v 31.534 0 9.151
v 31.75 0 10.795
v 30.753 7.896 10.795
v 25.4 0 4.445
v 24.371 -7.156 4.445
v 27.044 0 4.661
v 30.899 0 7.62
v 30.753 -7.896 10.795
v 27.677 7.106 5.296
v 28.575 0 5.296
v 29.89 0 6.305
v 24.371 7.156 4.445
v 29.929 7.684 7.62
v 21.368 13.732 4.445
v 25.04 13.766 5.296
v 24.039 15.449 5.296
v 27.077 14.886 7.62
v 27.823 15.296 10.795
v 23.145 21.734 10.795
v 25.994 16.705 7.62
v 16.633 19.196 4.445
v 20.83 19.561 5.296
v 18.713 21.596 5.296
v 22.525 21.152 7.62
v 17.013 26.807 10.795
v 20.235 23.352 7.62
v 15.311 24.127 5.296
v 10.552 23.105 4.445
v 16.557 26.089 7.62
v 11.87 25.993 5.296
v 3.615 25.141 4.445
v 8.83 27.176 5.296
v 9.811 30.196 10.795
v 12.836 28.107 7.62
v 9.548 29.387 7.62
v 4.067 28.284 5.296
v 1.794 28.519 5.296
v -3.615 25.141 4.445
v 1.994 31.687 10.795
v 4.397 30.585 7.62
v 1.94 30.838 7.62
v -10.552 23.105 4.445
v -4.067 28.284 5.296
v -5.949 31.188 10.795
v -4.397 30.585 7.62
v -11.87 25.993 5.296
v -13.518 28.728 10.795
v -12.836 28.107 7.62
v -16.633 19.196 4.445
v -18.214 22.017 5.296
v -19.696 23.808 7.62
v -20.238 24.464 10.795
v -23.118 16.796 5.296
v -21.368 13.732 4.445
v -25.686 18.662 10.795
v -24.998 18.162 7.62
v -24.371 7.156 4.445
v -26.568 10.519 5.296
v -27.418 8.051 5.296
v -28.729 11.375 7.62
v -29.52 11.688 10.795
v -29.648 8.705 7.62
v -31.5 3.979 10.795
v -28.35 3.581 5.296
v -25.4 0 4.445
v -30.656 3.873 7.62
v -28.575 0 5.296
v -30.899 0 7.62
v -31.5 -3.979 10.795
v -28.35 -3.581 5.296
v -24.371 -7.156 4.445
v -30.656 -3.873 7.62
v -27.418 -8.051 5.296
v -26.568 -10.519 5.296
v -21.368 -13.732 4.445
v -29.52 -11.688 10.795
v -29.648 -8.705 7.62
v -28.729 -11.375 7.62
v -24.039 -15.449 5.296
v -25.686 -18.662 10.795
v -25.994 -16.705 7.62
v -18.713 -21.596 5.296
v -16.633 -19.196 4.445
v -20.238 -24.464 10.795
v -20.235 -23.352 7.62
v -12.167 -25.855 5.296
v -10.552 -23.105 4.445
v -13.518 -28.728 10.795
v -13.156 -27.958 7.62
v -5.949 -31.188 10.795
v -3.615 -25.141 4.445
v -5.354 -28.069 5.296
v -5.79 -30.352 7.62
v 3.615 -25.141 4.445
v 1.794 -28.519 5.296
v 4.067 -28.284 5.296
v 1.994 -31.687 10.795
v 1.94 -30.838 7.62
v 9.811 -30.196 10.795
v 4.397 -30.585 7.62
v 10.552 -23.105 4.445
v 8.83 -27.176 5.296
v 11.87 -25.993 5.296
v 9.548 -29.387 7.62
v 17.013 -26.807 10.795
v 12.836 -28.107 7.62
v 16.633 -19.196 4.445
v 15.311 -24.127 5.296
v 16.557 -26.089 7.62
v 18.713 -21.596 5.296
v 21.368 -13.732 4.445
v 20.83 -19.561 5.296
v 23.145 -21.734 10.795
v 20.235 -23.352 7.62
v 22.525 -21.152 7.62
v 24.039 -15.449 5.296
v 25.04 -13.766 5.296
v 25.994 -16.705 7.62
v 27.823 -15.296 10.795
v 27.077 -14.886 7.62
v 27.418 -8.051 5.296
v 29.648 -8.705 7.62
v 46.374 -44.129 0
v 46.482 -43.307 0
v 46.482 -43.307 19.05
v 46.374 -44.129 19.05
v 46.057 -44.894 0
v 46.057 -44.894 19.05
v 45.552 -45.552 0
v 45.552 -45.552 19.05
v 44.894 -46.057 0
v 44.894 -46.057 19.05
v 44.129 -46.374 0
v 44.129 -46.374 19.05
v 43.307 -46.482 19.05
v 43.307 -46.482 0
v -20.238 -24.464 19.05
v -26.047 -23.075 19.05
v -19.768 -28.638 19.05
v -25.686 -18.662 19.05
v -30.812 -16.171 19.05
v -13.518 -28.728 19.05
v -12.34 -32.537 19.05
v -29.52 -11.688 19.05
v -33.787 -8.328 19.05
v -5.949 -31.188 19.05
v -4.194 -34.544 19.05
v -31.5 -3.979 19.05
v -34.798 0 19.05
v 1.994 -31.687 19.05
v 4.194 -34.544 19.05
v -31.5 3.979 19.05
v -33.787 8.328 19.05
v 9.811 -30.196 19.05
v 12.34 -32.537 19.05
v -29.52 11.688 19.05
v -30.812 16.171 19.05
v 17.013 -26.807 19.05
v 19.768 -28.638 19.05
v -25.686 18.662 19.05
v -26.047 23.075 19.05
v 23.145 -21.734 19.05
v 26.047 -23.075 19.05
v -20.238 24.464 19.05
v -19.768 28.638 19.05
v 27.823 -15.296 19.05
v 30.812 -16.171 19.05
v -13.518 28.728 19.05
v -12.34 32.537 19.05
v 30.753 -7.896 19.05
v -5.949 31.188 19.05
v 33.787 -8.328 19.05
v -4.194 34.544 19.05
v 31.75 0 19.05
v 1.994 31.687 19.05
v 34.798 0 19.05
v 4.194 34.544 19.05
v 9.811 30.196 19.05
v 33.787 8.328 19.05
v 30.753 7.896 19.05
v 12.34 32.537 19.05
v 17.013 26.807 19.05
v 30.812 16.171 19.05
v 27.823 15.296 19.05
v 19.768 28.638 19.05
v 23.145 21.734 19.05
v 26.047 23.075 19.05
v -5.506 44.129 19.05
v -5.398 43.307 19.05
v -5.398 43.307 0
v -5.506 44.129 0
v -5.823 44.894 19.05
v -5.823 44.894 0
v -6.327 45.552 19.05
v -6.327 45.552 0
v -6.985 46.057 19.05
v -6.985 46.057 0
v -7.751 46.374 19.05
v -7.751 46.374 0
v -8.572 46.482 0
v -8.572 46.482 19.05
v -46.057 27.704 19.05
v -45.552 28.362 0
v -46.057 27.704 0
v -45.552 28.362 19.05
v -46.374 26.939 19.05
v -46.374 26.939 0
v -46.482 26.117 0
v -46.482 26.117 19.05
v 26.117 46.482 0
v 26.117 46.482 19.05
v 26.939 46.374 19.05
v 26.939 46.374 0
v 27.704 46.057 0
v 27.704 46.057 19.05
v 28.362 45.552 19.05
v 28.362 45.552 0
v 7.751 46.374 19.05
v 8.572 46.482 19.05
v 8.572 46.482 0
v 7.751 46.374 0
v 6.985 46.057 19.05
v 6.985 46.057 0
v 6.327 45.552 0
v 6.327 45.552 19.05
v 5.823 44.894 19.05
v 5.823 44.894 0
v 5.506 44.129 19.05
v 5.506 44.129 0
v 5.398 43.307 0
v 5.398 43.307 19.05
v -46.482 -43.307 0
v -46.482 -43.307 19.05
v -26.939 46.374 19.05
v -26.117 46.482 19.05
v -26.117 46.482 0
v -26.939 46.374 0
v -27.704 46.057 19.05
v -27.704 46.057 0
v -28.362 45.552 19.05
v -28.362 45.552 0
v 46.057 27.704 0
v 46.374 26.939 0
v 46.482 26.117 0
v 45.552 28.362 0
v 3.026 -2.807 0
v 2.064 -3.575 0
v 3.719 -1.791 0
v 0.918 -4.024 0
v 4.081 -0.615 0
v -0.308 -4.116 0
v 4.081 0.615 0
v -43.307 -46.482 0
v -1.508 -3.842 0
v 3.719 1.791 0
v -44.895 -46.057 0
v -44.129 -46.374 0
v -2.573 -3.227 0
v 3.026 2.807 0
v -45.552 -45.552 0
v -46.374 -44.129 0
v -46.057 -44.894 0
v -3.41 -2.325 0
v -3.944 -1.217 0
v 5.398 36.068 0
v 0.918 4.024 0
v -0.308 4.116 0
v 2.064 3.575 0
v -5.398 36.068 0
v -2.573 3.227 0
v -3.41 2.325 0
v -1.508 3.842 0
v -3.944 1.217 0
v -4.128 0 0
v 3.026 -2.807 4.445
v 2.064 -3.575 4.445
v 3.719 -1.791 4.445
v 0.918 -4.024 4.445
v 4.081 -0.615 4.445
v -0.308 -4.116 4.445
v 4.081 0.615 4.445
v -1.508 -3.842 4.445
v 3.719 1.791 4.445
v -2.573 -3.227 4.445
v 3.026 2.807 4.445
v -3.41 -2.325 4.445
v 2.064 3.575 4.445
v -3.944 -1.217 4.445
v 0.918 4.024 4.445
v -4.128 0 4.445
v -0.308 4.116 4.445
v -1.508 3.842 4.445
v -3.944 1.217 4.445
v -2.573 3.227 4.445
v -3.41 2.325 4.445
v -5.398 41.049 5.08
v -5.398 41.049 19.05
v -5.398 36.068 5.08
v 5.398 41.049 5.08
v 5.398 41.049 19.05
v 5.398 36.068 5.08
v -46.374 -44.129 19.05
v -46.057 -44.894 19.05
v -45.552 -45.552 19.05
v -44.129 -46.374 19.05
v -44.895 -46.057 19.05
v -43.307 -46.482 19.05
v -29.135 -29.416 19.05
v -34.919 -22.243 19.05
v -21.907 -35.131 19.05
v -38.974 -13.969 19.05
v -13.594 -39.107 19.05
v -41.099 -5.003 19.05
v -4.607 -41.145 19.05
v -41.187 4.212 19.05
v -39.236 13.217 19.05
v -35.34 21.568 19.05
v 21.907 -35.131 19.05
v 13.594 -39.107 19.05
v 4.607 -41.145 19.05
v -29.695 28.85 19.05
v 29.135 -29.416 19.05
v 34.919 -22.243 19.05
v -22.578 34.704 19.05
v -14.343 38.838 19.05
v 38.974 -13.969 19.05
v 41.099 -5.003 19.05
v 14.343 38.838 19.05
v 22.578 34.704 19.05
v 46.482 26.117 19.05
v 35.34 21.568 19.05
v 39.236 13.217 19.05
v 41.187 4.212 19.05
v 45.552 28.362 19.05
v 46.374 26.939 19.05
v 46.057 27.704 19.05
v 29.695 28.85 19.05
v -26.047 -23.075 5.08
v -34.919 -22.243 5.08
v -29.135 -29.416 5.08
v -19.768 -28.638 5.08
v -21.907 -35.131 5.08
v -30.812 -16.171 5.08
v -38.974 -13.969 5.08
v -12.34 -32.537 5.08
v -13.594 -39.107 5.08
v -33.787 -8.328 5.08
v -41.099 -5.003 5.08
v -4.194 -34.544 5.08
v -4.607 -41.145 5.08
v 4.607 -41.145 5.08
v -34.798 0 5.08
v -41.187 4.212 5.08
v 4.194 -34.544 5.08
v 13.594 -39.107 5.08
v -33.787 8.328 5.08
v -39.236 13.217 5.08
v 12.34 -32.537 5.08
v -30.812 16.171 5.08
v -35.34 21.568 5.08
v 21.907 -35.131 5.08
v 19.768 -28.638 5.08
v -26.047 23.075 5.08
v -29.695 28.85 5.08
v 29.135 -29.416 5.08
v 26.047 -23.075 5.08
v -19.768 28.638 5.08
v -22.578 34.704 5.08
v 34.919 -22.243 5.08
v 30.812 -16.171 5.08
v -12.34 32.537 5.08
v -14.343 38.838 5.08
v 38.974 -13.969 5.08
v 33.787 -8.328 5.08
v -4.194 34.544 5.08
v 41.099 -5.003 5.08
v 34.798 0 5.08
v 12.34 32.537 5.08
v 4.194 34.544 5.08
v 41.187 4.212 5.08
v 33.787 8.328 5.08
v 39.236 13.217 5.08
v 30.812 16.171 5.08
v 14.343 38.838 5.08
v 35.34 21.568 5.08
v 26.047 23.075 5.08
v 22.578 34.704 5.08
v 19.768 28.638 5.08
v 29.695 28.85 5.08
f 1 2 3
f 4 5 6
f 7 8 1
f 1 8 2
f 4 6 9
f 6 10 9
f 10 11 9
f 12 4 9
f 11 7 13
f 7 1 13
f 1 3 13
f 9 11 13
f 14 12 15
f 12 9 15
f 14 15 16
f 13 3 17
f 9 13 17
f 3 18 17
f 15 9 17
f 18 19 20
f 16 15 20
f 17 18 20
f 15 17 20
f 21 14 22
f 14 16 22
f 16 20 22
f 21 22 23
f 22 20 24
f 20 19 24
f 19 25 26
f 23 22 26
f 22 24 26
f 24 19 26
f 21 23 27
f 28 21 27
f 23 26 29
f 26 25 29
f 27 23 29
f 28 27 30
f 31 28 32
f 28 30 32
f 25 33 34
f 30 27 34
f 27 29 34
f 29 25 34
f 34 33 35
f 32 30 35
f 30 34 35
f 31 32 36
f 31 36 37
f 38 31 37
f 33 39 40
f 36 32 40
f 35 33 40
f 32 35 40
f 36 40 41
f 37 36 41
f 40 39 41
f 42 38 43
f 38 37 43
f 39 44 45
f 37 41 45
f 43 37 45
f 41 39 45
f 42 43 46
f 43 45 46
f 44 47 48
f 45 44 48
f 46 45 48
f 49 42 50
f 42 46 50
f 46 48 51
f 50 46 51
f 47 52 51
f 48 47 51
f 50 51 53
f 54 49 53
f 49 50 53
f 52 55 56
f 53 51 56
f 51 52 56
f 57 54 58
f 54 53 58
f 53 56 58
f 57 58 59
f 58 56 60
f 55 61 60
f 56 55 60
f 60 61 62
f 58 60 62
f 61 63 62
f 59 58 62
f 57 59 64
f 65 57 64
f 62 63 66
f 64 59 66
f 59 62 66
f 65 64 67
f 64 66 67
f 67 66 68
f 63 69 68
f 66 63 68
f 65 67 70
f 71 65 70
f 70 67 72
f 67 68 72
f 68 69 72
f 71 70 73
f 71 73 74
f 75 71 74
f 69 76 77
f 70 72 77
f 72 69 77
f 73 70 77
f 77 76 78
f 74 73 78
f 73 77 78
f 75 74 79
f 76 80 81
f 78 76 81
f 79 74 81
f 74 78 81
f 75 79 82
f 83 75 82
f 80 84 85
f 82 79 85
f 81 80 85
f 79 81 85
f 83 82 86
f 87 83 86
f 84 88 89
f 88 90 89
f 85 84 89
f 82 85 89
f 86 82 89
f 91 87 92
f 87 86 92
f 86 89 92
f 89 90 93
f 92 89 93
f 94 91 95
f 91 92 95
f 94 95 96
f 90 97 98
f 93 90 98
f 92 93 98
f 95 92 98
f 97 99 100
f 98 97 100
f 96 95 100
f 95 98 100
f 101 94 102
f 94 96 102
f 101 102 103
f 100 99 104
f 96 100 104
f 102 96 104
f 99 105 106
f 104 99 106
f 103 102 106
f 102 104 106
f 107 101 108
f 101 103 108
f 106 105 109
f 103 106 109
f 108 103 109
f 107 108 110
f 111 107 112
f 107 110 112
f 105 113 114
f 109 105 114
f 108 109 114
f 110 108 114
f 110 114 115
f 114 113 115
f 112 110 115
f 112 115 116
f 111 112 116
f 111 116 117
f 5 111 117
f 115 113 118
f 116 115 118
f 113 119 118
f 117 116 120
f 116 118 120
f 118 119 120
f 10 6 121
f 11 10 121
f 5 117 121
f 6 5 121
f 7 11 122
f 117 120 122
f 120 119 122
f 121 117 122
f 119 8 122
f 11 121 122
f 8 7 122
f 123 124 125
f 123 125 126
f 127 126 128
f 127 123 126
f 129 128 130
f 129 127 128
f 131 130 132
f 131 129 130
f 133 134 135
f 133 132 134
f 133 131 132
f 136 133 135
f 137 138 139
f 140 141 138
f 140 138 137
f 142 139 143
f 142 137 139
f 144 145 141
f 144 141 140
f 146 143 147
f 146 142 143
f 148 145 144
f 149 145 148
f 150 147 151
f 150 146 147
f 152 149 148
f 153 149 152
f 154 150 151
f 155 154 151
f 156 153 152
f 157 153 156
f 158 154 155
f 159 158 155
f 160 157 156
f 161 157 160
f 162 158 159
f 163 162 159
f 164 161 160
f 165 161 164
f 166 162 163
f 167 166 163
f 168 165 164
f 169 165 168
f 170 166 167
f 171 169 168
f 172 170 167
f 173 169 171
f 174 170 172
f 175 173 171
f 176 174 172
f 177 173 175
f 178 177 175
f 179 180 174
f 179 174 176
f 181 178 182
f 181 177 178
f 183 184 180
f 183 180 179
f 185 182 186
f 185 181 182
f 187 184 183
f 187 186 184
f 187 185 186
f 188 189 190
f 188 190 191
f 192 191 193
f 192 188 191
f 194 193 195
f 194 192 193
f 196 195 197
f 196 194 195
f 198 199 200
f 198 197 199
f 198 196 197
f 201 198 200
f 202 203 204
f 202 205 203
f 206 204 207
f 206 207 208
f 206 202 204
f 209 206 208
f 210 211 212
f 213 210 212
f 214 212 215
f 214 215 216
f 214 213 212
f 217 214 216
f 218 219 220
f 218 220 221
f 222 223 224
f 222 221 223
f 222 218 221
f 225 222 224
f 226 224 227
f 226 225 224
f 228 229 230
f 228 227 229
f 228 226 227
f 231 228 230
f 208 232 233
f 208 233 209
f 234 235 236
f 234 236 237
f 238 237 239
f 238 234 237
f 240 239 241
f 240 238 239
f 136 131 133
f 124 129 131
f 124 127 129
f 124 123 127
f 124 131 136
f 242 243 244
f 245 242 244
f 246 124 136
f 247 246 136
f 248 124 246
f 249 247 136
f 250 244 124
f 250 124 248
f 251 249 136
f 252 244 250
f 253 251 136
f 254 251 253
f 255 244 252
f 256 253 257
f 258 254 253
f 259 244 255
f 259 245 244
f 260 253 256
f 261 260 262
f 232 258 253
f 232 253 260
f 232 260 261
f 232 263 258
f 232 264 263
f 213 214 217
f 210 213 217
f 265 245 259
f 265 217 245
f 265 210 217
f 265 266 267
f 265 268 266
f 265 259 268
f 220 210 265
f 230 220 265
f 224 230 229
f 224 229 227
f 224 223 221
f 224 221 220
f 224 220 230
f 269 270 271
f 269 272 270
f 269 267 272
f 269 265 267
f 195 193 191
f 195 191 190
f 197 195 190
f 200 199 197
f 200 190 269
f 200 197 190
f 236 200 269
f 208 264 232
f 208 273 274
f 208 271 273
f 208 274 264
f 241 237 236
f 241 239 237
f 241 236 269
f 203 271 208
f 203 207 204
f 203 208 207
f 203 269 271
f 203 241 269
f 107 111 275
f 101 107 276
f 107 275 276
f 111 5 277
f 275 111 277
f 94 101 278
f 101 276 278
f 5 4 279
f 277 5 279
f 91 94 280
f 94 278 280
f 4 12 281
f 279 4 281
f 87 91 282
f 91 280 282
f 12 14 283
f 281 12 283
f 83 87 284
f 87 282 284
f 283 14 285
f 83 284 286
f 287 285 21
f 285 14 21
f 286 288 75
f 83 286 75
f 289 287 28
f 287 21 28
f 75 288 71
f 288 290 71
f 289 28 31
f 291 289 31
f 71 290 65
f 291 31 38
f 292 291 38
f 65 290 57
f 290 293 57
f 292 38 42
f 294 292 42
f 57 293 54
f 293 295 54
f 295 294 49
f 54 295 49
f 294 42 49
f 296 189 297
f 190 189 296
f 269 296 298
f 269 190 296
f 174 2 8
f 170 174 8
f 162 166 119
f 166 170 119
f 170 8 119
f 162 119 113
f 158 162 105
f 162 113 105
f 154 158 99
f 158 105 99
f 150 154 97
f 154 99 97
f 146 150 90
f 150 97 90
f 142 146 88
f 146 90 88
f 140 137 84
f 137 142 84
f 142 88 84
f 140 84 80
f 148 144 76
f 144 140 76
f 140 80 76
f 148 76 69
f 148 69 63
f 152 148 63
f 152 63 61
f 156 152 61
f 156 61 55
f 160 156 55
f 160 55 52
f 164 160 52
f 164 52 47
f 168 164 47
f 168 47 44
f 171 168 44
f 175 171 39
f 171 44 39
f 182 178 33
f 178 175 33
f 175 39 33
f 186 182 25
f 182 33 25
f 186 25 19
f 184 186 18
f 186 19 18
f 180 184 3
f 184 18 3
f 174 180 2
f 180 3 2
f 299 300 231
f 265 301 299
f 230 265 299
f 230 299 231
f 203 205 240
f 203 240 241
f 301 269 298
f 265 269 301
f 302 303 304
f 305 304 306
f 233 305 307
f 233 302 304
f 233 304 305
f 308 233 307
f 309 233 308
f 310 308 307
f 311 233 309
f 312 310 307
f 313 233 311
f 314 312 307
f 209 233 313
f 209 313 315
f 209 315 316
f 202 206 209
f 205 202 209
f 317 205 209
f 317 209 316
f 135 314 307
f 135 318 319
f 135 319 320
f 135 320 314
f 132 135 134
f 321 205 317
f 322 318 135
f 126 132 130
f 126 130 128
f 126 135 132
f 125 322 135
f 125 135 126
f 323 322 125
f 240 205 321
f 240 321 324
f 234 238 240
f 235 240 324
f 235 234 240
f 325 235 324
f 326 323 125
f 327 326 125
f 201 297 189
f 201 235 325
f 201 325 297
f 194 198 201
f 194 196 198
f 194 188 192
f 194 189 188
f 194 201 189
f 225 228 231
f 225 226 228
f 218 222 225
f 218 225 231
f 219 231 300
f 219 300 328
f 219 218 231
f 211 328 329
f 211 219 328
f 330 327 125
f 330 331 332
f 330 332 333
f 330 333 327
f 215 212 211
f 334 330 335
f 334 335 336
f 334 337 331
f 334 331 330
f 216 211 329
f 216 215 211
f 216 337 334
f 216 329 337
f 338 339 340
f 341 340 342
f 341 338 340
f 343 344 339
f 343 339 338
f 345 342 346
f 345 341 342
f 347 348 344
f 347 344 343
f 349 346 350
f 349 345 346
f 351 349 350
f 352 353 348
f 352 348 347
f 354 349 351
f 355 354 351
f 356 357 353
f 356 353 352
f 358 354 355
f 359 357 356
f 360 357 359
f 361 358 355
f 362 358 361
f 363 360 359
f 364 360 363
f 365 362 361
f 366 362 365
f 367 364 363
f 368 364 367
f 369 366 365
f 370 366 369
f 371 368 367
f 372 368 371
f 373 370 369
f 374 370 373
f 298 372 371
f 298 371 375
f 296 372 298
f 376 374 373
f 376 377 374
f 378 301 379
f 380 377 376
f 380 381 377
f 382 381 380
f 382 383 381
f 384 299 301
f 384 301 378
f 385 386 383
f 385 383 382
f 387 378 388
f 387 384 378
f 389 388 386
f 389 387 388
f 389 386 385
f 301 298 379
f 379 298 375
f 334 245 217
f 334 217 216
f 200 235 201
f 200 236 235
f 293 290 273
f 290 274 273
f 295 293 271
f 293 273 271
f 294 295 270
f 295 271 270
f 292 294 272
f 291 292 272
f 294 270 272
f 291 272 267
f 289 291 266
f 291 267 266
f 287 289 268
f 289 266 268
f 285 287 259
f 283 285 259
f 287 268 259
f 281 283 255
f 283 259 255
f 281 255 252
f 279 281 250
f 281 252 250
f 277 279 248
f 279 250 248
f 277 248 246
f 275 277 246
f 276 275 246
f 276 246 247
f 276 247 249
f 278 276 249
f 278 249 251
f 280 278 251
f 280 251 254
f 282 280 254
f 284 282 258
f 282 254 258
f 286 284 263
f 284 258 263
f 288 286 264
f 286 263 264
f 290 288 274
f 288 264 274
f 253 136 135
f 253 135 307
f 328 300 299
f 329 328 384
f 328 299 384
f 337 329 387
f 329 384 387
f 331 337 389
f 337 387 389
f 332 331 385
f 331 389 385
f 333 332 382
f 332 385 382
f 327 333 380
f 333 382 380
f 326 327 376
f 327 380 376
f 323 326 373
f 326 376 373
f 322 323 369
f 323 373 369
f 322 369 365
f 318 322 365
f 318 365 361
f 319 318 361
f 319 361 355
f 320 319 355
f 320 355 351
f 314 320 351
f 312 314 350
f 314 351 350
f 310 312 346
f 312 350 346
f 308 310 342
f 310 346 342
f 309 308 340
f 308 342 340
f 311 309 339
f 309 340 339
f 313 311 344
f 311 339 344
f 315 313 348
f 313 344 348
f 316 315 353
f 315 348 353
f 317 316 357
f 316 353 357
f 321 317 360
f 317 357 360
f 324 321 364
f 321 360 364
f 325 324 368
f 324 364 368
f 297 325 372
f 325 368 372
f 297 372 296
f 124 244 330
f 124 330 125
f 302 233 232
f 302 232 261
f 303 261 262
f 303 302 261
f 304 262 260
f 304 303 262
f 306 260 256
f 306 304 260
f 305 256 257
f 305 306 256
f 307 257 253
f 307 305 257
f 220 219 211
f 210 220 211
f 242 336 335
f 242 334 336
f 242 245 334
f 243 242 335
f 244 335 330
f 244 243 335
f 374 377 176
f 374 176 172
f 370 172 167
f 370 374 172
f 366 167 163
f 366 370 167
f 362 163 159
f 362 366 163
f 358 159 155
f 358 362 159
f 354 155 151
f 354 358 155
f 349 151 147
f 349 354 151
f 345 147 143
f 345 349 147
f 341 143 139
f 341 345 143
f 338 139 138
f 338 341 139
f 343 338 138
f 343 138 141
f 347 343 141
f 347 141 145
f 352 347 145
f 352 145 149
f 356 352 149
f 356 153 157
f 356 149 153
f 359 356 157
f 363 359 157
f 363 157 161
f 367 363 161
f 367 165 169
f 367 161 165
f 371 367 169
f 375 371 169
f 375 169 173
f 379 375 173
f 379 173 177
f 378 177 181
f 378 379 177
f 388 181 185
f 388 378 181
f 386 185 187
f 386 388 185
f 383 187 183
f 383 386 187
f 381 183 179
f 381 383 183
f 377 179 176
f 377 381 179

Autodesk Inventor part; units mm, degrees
ref_plane "YZ Plane" through (0, 0, 0) normal (1, 0, 0) x (0, 1, 0)
ref_plane "XZ Plane" through (0, 0, 0) normal (0, 1, 0) x (-1, 0, 0)
ref_plane "XY Plane" through (0, 0, 0) normal (0, 0, 1) x (1, 0, 0)
sketch "Sketch1" plane through (0, 0, 0) normal (0, 0, 1) x (1, 0, 0)
  circle A0 centre (0, 0) radius 31.75
  circle A1 centre (0, 0) radius 34.798
  circle A2 centre (0, 0) radius 41.402
  line L0 (-46.482, 46.482) -> (46.482, 46.482)
  line L1 (46.482, 46.482) -> (46.482, -46.482)
  line L2 (46.482, -46.482) -> (-46.482, -46.482)
  line L3 (-46.482, -46.482) -> (-46.482, 46.482)
  line L4 (0, 46.482) -> (0, 41.402) construction
  line L5 (0, -41.402) -> (0, -46.482) construction
  line L6 (-46.482, 0) -> (-41.402, 0) construction
  line L7 (46.482, 0) -> (41.402, 0) construction
  dimension "d0" = 63.5
  dimension "d1" = 69.596
  dimension "d2" = 82.804
  dimension "d3" = 5.08
extrude "Extrusion1" add sketch "Sketch1" along normal blind 5.08 contours A1 | A2 | L0 L1 L2 L3
extrude "Extrusion2" add sketch "Sketch1" along normal blind 19.05 contours A1
extrude "Extrusion3" add sketch "Sketch1" along normal blind 19.05 contours L0 L1 L2 L3
sketch "Sketch2" plane through (0, 0, 0) normal (0, 0, -1) x (-1, 0, 0)
  circle A0 centre (0, 0) radius 34.798 construction
  line L0 (46.482, 46.482) -> (-46.482, 46.482) projected
  line L1 (-5.3975, 46.482) -> (5.3975, 46.482)
  line L2 (5.3975, 46.482) -> (5.3975, 36.068)
  line L3 (5.3975, 36.068) -> (-5.3975, 36.068)
  line L4 (-5.3975, 36.068) -> (-5.3975, 46.482)
  line L5 (0, 34.798) -> (0, 36.068) construction
  dimension "d10" = 10.795
  dimension "d11" = 1.27
extrude "Extrusion4" cut sketch "Sketch2" against normal blind 19.05
chamfer "Chamfer1" distance 19.05 angle 45 2 edges at (46.482, 46.482, 9.525) (-46.482, 46.482, 9.525)
fillet "Fillet1" radius 3.175 8 edges at (46.482, -46.482, 9.525) (46.482, 27.432, 9.525) (27.432, 46.482, 9.525) (5.3975, 46.482, 9.525) (-5.3975, 46.482, 9.525) (-27.432, 46.482, 9.525) (-46.482, 27.432, 9.525) (-46.482, -46.482, 9.525)
sketch "Sketch3" plane through (0, 0, 0) normal (0, 0, -1) x (-1, 0, 0)
  circle A0 centre (0, 0) radius 31.75 projected
  circle A1 centre (0, 0) radius 4.1275
  dimension "d18" = 8.255
extrude "Extrusion5" add sketch "Sketch3" against normal blind 4.445
fillet "Fillet2" radius 6.35 1 edges at (-31.75, 0, 4.445)
properties part number "BallastTankMillFixture"
